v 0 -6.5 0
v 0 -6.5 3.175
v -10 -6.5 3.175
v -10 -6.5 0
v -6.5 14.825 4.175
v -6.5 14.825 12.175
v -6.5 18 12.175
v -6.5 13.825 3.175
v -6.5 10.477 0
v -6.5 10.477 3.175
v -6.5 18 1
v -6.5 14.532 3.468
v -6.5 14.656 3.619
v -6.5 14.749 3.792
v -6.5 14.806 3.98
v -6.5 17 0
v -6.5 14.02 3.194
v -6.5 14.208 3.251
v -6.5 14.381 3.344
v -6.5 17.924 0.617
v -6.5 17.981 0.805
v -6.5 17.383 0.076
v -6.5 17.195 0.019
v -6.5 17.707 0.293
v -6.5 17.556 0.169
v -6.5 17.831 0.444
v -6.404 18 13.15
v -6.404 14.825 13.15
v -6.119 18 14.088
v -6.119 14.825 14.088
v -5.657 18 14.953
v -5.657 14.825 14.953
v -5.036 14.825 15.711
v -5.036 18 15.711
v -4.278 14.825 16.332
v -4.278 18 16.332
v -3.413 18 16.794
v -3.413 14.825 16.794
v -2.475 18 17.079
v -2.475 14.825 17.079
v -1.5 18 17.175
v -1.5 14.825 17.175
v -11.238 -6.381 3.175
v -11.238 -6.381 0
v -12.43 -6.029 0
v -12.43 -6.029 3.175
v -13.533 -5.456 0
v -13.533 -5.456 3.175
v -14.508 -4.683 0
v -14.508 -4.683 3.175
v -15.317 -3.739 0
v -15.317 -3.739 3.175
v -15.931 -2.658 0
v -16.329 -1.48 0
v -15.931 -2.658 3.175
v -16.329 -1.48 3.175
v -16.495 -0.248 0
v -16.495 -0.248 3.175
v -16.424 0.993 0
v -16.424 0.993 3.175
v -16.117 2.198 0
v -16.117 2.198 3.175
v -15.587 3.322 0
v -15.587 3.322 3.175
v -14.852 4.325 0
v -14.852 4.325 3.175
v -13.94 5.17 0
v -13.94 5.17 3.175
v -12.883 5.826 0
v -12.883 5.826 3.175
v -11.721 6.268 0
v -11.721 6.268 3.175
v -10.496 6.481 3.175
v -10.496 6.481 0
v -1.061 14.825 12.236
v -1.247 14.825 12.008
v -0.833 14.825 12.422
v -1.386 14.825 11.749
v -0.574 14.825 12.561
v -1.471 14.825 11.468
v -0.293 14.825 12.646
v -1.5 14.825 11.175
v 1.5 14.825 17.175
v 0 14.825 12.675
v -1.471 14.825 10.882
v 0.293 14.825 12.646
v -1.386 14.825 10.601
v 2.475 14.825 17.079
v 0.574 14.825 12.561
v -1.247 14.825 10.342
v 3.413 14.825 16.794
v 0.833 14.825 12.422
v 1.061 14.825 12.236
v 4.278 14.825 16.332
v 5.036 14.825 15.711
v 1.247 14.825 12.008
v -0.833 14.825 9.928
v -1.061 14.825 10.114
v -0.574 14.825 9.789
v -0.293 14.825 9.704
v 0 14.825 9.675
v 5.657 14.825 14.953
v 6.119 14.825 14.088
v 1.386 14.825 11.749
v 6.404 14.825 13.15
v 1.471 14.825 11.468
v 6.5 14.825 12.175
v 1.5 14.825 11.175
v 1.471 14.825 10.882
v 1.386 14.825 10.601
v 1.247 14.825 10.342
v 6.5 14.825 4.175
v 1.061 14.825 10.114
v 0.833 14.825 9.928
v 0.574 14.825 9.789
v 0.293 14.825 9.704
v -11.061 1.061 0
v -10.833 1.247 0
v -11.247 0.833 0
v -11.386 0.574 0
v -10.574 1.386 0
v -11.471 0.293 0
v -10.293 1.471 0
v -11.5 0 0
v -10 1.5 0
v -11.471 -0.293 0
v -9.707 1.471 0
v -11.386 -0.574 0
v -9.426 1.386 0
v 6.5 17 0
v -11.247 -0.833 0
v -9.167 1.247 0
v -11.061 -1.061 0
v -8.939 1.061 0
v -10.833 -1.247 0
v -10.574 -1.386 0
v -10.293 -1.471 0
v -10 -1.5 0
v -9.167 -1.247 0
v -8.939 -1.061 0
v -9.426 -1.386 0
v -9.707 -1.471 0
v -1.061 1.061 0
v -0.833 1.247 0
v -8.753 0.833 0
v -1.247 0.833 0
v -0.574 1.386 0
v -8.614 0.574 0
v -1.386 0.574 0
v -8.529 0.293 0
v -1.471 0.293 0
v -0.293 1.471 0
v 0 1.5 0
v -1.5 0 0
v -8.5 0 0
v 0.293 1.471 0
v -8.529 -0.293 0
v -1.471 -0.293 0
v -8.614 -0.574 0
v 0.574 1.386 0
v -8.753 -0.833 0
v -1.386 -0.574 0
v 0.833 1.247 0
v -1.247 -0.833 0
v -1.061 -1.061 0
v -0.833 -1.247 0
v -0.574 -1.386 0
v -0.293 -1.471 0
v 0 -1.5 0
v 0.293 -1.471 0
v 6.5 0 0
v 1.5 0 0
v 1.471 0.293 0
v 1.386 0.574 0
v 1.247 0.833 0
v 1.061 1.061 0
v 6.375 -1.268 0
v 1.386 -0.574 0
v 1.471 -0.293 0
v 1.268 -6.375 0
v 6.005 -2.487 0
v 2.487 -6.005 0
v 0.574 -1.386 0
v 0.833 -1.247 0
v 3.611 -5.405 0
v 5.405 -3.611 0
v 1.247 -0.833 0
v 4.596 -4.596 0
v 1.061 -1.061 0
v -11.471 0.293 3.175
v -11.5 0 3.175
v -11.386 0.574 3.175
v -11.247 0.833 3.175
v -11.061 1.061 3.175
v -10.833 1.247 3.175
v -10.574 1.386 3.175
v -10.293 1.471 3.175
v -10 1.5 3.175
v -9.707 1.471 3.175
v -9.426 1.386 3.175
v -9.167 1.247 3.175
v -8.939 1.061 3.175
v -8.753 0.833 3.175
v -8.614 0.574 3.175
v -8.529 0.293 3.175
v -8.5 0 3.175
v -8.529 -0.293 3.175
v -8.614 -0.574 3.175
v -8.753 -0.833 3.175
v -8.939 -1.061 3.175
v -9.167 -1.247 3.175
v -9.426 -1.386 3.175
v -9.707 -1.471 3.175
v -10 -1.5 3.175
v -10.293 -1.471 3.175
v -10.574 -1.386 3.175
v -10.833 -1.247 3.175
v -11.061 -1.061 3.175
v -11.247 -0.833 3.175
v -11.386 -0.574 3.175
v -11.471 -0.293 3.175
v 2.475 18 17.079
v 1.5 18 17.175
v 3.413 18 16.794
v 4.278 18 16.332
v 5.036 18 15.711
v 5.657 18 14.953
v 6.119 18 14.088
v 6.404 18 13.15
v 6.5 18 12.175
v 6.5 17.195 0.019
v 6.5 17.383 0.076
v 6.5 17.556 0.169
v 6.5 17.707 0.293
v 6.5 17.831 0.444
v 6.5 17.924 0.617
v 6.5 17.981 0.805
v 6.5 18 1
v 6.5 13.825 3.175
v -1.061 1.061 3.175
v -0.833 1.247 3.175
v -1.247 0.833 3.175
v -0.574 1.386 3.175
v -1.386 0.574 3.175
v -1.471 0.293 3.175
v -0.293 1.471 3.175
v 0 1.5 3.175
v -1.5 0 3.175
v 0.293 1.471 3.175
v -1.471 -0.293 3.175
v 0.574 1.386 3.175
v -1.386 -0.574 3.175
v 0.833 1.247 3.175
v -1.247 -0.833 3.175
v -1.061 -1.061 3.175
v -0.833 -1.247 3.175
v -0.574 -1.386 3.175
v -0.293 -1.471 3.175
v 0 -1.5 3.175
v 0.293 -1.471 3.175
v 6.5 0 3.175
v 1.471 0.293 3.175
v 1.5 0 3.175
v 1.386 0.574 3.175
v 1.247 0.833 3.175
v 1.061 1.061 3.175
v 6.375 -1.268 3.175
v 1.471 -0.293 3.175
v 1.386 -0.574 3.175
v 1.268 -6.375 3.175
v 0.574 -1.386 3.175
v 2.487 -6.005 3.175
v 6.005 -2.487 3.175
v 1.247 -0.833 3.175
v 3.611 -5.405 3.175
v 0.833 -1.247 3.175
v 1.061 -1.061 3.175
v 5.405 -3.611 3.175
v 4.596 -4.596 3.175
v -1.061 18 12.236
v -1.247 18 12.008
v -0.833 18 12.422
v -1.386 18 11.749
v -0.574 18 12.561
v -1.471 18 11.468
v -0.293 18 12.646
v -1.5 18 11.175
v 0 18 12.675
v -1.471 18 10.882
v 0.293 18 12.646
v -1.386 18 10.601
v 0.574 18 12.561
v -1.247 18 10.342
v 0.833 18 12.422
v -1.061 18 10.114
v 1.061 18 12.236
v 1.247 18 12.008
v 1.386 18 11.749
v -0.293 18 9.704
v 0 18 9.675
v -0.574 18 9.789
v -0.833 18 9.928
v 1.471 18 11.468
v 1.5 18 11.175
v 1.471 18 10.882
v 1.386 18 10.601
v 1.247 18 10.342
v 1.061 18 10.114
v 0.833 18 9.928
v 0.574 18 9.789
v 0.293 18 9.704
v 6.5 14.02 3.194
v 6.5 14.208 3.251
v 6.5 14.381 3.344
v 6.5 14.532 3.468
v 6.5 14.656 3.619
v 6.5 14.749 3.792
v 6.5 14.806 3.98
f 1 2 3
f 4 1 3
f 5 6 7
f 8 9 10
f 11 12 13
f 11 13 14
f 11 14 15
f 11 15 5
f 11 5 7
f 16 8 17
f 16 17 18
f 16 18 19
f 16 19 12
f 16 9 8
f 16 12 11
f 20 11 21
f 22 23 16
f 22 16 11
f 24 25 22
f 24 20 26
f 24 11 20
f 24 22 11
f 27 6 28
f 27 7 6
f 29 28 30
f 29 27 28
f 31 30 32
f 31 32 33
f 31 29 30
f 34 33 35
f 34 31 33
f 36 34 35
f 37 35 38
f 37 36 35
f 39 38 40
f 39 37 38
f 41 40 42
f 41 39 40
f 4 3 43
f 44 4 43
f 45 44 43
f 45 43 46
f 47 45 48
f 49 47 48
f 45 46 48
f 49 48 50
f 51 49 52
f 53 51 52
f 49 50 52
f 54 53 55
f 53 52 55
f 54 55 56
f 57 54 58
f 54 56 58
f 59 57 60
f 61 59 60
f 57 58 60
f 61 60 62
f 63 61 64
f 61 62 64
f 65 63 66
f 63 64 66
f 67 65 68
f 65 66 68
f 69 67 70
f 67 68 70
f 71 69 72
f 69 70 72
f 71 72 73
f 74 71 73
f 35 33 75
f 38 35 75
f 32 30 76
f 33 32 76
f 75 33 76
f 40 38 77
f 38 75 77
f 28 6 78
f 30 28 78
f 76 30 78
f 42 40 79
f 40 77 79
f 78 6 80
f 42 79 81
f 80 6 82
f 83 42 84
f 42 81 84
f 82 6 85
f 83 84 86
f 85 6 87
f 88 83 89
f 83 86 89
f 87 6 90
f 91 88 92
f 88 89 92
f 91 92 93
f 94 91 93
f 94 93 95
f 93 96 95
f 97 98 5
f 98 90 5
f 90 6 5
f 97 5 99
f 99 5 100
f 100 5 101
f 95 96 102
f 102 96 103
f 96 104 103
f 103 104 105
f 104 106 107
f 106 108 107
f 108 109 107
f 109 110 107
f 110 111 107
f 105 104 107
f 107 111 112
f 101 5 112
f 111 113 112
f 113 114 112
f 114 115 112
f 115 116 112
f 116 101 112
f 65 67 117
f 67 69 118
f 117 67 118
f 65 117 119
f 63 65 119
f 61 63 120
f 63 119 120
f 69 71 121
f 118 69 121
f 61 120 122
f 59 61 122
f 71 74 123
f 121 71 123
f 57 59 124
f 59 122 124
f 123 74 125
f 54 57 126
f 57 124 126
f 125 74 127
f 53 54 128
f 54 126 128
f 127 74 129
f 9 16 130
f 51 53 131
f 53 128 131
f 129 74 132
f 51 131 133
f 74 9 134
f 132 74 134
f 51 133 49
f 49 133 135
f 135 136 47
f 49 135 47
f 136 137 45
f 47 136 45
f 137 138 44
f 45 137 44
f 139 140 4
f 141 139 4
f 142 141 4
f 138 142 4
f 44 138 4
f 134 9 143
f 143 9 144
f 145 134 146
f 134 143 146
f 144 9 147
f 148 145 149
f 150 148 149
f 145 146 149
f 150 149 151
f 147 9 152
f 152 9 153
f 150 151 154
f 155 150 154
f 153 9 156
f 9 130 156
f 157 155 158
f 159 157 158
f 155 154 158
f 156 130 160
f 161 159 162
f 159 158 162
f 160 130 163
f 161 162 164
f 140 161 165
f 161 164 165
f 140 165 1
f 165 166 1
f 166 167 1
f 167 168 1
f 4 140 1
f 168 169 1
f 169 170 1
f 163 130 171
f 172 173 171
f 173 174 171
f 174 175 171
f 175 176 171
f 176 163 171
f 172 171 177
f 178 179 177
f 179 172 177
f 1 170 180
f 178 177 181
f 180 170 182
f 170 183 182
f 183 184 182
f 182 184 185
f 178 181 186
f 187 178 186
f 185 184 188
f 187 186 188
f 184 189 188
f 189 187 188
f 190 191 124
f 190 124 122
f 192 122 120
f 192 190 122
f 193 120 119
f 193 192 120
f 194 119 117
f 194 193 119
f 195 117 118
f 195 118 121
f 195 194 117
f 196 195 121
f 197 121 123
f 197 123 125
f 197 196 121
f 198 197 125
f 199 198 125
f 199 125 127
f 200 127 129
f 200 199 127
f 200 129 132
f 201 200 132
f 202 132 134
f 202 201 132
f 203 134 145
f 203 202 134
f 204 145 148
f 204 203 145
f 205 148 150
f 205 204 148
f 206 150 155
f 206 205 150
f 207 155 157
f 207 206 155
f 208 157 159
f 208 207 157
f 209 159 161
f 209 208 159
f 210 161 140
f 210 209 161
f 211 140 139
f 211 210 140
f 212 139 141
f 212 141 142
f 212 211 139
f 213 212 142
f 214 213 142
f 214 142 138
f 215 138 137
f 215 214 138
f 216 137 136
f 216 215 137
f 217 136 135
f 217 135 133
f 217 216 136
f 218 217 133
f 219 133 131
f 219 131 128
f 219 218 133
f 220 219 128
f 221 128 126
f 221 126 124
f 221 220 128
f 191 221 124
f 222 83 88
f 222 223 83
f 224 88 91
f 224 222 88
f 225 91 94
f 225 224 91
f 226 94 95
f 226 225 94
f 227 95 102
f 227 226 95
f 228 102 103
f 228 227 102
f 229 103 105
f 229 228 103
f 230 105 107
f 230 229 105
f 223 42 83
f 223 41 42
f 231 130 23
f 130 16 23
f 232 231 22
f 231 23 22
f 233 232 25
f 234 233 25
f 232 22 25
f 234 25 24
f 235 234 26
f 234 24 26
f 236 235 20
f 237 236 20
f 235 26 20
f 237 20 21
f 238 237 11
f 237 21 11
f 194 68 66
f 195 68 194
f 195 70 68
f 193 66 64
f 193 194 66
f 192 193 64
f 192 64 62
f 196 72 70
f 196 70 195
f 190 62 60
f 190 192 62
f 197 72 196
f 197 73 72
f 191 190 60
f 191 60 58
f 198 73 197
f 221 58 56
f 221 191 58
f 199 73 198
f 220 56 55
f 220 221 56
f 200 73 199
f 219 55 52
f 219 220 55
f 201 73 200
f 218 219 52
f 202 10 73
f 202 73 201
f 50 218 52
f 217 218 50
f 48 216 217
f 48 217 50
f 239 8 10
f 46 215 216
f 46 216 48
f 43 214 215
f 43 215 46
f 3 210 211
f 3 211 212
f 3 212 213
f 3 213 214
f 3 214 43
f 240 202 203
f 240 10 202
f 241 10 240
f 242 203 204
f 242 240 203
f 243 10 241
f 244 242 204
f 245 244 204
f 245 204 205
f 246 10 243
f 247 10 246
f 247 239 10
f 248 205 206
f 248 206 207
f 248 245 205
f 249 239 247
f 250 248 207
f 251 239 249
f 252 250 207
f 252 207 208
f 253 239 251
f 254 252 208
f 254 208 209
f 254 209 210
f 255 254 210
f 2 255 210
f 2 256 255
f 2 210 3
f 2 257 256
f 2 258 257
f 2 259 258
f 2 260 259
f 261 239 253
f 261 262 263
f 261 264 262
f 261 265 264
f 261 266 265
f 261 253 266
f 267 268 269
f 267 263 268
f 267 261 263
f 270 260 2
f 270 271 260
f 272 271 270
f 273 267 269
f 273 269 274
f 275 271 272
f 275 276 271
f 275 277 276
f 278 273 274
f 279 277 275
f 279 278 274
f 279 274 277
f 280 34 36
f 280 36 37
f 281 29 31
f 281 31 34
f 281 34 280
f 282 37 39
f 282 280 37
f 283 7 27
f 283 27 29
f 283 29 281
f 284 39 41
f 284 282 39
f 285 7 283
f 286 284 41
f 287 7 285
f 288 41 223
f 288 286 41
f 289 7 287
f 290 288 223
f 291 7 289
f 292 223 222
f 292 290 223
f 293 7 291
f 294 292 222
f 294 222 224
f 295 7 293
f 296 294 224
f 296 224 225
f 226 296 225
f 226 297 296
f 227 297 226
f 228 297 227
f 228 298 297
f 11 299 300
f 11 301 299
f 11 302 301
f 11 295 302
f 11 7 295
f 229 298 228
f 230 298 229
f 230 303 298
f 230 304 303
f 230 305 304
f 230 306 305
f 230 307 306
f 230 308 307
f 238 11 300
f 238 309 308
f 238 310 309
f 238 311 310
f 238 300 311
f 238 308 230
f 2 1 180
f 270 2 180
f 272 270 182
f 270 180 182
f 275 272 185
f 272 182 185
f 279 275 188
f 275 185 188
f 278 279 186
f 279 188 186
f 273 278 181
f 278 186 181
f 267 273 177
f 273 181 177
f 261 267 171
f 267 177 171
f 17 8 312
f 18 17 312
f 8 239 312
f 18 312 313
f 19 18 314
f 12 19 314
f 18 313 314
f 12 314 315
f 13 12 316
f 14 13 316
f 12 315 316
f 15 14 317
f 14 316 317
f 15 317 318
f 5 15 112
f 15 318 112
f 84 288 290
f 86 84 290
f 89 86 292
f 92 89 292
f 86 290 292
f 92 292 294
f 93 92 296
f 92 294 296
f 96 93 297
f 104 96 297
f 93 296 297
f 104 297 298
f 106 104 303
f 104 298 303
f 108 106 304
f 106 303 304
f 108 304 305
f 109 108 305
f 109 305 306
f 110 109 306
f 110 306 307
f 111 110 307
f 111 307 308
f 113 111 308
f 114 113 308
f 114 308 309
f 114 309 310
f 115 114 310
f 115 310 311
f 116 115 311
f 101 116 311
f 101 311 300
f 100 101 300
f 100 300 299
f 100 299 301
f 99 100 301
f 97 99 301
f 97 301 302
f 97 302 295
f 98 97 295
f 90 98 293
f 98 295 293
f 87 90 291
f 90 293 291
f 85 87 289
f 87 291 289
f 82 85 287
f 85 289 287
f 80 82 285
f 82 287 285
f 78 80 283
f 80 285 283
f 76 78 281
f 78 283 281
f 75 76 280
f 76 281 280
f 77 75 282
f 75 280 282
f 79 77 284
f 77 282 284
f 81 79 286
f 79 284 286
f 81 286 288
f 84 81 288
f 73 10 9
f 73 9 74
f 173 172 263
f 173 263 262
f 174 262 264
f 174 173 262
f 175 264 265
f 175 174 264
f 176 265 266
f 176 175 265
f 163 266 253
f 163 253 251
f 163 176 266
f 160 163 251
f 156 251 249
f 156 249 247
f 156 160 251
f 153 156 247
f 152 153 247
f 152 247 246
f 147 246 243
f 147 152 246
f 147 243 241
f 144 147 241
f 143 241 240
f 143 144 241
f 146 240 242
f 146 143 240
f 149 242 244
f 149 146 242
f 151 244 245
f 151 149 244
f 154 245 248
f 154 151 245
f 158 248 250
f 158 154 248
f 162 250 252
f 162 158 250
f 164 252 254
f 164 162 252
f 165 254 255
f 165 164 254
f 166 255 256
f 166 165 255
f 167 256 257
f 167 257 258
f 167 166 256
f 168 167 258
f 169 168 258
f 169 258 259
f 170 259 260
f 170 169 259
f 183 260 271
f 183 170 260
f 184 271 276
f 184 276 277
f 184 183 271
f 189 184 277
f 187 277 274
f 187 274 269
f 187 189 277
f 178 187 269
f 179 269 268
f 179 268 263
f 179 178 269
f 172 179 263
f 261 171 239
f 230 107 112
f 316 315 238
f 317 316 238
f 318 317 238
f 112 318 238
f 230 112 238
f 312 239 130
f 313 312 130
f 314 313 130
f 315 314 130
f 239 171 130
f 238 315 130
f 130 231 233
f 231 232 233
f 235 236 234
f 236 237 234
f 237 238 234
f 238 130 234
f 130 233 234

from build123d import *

# Parameters (mm, degrees)
SKETCH1_R               = 6.5
SKETCH1_R_2             = 1.5
BOSS_EXTRUDE1_DEPTH     = 3.175
SKETCH2_W               = 13
SKETCH2_H               = 3.175
BOSS_EXTRUDE2_DEPTH     = 14
SKETCH3_R               = 1.5
CUT_EXTRUDE1_DEPTH      = 18
FILLET1_R               = 5
BOSS_EXTRUDE3_START     = -3.175
BOSS_EXTRUDE3_OUTLINE_R = 1.5
BOSS_EXTRUDE3_DEPTH     = 3.175
FILLET3_R               = 1
CHAMFER1_SIZE           = 5


with BuildPart() as part:
    # Sketch1 → Boss-Extrude1 (new body)
    # profile 1 of 2: a face of its own
    with BuildSketch(Plane.XY):
        Circle(SKETCH1_R)
        Circle(SKETCH1_R_2, mode=Mode.SUBTRACT)
    # profile 2 of 2: a face of its own
    with BuildSketch(Plane.XY):
        with BuildLine():
            Line((-6.5, 18), (-6.5, 0))
            ThreePointArc((-6.5, 0), (0, 6.5), (6.5, 0))
            Line((6.5, 0), (6.5, 18))
            Line((6.5, 18), (-6.5, 18))
        make_face()
    extrude(amount=BOSS_EXTRUDE1_DEPTH)

    # Sketch2 → Boss-Extrude2 (add)
    with BuildSketch(Plane.XY.offset(3.175)):
        with Locations((0, 16.4125)):
            Rectangle(SKETCH2_W, SKETCH2_H)
    extrude(amount=BOSS_EXTRUDE2_DEPTH)

    # Sketch3 → Cut-Extrude1 (cut)
    with BuildSketch(Plane(origin=(0, 18, 0), x_dir=(1, 0, 0), z_dir=(0, 1, 0))):
        with Locations(Location((0, -11.175, 0), (0, 0, 270))):
            Circle(SKETCH3_R)
    extrude(amount=-CUT_EXTRUDE1_DEPTH, mode=Mode.SUBTRACT)

    # Fillet1
    fillet1_edges = [part.edges().sort_by_distance(p)[0] for p in [
        (-6.5, 16.4125, 17.175),
        (6.5, 16.4125, 17.175),
    ]]
    fillet(fillet1_edges, radius=FILLET1_R)

    # Boss-Extrude3: read off the stored shape, not the designer's step
    # Boss-Extrude3 outline → Boss-Extrude3 (add)
    with BuildSketch(Plane(origin=(0, 0, 0), x_dir=(-1, 0, 0), z_dir=(0, 0, -1)).offset(BOSS_EXTRUDE3_START)):
        with BuildLine():
            ThreePointArc((6.5, 0), (4.596194078, -4.596194078), (0, -6.5))
            Line((0, -6.5), (10, -6.5))
            ThreePointArc((10, -6.5), (16.239069091, 1.823188658), (6.5, 5.477225575))
            Line((6.5, 5.477225575), (6.5, 0))
        make_face()
        with Locations((10, 0)):
            Circle(BOSS_EXTRUDE3_OUTLINE_R, mode=Mode.SUBTRACT)
    extrude(amount=BOSS_EXTRUDE3_DEPTH)

    # Fillet3
    fillet3_edges = [part.edges().sort_by_distance(p)[0] for p in [
        (0, 14.825, 3.175),
        (0, 18, 0),
    ]]
    fillet(fillet3_edges, radius=FILLET3_R)

    # Chamfer1
    # the kernel refuses this chamfer: 5, 3.62027218 mm, written as the material it adds along each edge
    with BuildSketch(Plane(origin=(-6.5, 5.477225575, 3.175), x_dir=(0, 1, 0), z_dir=(0, 0, -1))) as chamfer1_piece_1:
        with BuildLine():
            Line((CHAMFER1_SIZE, 0), (1.003807775, -3.996192225))
            ThreePointArc((1.003807775, -3.996192225), (0.840081721, -1.969761939), (0, 0))
            Line((0, 0), (CHAMFER1_SIZE, 0))
        make_face()
    extrude(amount=3.175)


solid = part.part
